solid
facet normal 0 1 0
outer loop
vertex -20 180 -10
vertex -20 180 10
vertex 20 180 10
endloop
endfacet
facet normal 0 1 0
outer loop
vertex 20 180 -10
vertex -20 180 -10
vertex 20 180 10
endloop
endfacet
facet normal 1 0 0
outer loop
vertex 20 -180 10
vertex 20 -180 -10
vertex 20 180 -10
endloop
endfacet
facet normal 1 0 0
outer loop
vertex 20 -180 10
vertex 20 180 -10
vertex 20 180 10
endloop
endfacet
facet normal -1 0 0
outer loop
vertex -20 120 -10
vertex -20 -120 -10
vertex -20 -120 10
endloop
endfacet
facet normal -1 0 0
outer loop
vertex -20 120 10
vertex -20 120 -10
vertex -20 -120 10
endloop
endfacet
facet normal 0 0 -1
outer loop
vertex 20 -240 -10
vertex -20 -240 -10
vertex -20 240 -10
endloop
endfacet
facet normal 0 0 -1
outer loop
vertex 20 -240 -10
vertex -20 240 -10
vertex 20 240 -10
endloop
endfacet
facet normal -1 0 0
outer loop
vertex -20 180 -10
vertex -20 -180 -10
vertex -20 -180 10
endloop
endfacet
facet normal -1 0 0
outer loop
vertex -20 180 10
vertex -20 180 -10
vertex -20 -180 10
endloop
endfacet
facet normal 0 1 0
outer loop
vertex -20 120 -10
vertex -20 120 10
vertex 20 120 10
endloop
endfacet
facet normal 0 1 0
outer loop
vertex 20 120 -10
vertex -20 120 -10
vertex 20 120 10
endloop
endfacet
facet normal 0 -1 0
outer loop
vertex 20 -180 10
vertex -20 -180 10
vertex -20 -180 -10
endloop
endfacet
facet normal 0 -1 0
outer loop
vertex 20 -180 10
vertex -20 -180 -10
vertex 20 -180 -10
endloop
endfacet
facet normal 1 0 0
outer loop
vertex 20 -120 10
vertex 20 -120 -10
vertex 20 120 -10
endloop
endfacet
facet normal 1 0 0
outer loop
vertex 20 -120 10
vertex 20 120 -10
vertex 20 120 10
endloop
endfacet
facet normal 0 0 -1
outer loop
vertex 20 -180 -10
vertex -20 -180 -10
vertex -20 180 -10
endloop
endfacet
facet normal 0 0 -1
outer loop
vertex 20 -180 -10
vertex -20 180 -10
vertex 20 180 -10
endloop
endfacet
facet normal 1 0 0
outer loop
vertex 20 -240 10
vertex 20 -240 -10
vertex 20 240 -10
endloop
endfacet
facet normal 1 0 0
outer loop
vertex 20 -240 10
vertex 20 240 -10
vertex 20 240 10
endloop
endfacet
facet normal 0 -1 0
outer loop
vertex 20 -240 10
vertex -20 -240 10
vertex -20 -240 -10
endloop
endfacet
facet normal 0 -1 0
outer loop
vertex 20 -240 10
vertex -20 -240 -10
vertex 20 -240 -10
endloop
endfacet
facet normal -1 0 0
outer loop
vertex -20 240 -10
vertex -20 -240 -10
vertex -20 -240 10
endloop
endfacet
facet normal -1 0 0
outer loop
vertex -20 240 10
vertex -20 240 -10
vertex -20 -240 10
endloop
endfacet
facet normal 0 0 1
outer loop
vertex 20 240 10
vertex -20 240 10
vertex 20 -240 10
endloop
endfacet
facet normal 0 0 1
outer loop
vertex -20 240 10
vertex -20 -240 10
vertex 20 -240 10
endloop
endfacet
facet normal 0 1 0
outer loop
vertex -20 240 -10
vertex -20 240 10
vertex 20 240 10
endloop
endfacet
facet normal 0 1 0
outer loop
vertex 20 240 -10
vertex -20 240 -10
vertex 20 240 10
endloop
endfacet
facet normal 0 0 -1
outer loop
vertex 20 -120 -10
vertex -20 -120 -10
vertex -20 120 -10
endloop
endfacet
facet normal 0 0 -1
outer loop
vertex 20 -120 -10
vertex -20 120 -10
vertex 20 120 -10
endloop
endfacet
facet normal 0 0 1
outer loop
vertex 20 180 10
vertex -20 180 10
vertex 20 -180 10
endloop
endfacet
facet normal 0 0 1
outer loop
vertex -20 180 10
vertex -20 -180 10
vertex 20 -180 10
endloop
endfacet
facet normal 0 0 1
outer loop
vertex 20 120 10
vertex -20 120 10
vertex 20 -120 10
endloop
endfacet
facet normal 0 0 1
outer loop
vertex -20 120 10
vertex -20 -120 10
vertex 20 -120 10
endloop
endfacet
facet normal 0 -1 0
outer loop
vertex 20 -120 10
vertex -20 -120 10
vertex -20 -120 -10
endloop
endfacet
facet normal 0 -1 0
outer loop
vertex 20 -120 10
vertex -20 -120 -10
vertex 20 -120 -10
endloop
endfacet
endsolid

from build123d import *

# Parameters (mm, degrees)
F0_W     = 40
F0_H     = 20
F1_DEPTH = 240
F2_W     = 40
F2_H     = 20
F3_DEPTH = 180
F4_W     = 40
F4_H     = 20
F5_DEPTH = 120


with BuildPart() as f1:
    # F0 (on Front) → F1 (new body, symmetric)
    with BuildSketch(Plane.XZ):
        Rectangle(F0_W, F0_H)
    extrude(amount=F1_DEPTH, both=True)


with BuildPart() as f3:
    # F2 (on Front) → F3 (new body, symmetric)
    with BuildSketch(Plane.XZ):
        Rectangle(F2_W, F2_H)
    extrude(amount=F3_DEPTH, both=True)


with BuildPart() as f5:
    # F4 (on Front) → F5 (new body, symmetric)
    with BuildSketch(Plane.XZ):
        Rectangle(F4_W, F4_H)
    extrude(amount=F5_DEPTH, both=True)


solid = Compound([f1.part, f3.part, f5.part])
